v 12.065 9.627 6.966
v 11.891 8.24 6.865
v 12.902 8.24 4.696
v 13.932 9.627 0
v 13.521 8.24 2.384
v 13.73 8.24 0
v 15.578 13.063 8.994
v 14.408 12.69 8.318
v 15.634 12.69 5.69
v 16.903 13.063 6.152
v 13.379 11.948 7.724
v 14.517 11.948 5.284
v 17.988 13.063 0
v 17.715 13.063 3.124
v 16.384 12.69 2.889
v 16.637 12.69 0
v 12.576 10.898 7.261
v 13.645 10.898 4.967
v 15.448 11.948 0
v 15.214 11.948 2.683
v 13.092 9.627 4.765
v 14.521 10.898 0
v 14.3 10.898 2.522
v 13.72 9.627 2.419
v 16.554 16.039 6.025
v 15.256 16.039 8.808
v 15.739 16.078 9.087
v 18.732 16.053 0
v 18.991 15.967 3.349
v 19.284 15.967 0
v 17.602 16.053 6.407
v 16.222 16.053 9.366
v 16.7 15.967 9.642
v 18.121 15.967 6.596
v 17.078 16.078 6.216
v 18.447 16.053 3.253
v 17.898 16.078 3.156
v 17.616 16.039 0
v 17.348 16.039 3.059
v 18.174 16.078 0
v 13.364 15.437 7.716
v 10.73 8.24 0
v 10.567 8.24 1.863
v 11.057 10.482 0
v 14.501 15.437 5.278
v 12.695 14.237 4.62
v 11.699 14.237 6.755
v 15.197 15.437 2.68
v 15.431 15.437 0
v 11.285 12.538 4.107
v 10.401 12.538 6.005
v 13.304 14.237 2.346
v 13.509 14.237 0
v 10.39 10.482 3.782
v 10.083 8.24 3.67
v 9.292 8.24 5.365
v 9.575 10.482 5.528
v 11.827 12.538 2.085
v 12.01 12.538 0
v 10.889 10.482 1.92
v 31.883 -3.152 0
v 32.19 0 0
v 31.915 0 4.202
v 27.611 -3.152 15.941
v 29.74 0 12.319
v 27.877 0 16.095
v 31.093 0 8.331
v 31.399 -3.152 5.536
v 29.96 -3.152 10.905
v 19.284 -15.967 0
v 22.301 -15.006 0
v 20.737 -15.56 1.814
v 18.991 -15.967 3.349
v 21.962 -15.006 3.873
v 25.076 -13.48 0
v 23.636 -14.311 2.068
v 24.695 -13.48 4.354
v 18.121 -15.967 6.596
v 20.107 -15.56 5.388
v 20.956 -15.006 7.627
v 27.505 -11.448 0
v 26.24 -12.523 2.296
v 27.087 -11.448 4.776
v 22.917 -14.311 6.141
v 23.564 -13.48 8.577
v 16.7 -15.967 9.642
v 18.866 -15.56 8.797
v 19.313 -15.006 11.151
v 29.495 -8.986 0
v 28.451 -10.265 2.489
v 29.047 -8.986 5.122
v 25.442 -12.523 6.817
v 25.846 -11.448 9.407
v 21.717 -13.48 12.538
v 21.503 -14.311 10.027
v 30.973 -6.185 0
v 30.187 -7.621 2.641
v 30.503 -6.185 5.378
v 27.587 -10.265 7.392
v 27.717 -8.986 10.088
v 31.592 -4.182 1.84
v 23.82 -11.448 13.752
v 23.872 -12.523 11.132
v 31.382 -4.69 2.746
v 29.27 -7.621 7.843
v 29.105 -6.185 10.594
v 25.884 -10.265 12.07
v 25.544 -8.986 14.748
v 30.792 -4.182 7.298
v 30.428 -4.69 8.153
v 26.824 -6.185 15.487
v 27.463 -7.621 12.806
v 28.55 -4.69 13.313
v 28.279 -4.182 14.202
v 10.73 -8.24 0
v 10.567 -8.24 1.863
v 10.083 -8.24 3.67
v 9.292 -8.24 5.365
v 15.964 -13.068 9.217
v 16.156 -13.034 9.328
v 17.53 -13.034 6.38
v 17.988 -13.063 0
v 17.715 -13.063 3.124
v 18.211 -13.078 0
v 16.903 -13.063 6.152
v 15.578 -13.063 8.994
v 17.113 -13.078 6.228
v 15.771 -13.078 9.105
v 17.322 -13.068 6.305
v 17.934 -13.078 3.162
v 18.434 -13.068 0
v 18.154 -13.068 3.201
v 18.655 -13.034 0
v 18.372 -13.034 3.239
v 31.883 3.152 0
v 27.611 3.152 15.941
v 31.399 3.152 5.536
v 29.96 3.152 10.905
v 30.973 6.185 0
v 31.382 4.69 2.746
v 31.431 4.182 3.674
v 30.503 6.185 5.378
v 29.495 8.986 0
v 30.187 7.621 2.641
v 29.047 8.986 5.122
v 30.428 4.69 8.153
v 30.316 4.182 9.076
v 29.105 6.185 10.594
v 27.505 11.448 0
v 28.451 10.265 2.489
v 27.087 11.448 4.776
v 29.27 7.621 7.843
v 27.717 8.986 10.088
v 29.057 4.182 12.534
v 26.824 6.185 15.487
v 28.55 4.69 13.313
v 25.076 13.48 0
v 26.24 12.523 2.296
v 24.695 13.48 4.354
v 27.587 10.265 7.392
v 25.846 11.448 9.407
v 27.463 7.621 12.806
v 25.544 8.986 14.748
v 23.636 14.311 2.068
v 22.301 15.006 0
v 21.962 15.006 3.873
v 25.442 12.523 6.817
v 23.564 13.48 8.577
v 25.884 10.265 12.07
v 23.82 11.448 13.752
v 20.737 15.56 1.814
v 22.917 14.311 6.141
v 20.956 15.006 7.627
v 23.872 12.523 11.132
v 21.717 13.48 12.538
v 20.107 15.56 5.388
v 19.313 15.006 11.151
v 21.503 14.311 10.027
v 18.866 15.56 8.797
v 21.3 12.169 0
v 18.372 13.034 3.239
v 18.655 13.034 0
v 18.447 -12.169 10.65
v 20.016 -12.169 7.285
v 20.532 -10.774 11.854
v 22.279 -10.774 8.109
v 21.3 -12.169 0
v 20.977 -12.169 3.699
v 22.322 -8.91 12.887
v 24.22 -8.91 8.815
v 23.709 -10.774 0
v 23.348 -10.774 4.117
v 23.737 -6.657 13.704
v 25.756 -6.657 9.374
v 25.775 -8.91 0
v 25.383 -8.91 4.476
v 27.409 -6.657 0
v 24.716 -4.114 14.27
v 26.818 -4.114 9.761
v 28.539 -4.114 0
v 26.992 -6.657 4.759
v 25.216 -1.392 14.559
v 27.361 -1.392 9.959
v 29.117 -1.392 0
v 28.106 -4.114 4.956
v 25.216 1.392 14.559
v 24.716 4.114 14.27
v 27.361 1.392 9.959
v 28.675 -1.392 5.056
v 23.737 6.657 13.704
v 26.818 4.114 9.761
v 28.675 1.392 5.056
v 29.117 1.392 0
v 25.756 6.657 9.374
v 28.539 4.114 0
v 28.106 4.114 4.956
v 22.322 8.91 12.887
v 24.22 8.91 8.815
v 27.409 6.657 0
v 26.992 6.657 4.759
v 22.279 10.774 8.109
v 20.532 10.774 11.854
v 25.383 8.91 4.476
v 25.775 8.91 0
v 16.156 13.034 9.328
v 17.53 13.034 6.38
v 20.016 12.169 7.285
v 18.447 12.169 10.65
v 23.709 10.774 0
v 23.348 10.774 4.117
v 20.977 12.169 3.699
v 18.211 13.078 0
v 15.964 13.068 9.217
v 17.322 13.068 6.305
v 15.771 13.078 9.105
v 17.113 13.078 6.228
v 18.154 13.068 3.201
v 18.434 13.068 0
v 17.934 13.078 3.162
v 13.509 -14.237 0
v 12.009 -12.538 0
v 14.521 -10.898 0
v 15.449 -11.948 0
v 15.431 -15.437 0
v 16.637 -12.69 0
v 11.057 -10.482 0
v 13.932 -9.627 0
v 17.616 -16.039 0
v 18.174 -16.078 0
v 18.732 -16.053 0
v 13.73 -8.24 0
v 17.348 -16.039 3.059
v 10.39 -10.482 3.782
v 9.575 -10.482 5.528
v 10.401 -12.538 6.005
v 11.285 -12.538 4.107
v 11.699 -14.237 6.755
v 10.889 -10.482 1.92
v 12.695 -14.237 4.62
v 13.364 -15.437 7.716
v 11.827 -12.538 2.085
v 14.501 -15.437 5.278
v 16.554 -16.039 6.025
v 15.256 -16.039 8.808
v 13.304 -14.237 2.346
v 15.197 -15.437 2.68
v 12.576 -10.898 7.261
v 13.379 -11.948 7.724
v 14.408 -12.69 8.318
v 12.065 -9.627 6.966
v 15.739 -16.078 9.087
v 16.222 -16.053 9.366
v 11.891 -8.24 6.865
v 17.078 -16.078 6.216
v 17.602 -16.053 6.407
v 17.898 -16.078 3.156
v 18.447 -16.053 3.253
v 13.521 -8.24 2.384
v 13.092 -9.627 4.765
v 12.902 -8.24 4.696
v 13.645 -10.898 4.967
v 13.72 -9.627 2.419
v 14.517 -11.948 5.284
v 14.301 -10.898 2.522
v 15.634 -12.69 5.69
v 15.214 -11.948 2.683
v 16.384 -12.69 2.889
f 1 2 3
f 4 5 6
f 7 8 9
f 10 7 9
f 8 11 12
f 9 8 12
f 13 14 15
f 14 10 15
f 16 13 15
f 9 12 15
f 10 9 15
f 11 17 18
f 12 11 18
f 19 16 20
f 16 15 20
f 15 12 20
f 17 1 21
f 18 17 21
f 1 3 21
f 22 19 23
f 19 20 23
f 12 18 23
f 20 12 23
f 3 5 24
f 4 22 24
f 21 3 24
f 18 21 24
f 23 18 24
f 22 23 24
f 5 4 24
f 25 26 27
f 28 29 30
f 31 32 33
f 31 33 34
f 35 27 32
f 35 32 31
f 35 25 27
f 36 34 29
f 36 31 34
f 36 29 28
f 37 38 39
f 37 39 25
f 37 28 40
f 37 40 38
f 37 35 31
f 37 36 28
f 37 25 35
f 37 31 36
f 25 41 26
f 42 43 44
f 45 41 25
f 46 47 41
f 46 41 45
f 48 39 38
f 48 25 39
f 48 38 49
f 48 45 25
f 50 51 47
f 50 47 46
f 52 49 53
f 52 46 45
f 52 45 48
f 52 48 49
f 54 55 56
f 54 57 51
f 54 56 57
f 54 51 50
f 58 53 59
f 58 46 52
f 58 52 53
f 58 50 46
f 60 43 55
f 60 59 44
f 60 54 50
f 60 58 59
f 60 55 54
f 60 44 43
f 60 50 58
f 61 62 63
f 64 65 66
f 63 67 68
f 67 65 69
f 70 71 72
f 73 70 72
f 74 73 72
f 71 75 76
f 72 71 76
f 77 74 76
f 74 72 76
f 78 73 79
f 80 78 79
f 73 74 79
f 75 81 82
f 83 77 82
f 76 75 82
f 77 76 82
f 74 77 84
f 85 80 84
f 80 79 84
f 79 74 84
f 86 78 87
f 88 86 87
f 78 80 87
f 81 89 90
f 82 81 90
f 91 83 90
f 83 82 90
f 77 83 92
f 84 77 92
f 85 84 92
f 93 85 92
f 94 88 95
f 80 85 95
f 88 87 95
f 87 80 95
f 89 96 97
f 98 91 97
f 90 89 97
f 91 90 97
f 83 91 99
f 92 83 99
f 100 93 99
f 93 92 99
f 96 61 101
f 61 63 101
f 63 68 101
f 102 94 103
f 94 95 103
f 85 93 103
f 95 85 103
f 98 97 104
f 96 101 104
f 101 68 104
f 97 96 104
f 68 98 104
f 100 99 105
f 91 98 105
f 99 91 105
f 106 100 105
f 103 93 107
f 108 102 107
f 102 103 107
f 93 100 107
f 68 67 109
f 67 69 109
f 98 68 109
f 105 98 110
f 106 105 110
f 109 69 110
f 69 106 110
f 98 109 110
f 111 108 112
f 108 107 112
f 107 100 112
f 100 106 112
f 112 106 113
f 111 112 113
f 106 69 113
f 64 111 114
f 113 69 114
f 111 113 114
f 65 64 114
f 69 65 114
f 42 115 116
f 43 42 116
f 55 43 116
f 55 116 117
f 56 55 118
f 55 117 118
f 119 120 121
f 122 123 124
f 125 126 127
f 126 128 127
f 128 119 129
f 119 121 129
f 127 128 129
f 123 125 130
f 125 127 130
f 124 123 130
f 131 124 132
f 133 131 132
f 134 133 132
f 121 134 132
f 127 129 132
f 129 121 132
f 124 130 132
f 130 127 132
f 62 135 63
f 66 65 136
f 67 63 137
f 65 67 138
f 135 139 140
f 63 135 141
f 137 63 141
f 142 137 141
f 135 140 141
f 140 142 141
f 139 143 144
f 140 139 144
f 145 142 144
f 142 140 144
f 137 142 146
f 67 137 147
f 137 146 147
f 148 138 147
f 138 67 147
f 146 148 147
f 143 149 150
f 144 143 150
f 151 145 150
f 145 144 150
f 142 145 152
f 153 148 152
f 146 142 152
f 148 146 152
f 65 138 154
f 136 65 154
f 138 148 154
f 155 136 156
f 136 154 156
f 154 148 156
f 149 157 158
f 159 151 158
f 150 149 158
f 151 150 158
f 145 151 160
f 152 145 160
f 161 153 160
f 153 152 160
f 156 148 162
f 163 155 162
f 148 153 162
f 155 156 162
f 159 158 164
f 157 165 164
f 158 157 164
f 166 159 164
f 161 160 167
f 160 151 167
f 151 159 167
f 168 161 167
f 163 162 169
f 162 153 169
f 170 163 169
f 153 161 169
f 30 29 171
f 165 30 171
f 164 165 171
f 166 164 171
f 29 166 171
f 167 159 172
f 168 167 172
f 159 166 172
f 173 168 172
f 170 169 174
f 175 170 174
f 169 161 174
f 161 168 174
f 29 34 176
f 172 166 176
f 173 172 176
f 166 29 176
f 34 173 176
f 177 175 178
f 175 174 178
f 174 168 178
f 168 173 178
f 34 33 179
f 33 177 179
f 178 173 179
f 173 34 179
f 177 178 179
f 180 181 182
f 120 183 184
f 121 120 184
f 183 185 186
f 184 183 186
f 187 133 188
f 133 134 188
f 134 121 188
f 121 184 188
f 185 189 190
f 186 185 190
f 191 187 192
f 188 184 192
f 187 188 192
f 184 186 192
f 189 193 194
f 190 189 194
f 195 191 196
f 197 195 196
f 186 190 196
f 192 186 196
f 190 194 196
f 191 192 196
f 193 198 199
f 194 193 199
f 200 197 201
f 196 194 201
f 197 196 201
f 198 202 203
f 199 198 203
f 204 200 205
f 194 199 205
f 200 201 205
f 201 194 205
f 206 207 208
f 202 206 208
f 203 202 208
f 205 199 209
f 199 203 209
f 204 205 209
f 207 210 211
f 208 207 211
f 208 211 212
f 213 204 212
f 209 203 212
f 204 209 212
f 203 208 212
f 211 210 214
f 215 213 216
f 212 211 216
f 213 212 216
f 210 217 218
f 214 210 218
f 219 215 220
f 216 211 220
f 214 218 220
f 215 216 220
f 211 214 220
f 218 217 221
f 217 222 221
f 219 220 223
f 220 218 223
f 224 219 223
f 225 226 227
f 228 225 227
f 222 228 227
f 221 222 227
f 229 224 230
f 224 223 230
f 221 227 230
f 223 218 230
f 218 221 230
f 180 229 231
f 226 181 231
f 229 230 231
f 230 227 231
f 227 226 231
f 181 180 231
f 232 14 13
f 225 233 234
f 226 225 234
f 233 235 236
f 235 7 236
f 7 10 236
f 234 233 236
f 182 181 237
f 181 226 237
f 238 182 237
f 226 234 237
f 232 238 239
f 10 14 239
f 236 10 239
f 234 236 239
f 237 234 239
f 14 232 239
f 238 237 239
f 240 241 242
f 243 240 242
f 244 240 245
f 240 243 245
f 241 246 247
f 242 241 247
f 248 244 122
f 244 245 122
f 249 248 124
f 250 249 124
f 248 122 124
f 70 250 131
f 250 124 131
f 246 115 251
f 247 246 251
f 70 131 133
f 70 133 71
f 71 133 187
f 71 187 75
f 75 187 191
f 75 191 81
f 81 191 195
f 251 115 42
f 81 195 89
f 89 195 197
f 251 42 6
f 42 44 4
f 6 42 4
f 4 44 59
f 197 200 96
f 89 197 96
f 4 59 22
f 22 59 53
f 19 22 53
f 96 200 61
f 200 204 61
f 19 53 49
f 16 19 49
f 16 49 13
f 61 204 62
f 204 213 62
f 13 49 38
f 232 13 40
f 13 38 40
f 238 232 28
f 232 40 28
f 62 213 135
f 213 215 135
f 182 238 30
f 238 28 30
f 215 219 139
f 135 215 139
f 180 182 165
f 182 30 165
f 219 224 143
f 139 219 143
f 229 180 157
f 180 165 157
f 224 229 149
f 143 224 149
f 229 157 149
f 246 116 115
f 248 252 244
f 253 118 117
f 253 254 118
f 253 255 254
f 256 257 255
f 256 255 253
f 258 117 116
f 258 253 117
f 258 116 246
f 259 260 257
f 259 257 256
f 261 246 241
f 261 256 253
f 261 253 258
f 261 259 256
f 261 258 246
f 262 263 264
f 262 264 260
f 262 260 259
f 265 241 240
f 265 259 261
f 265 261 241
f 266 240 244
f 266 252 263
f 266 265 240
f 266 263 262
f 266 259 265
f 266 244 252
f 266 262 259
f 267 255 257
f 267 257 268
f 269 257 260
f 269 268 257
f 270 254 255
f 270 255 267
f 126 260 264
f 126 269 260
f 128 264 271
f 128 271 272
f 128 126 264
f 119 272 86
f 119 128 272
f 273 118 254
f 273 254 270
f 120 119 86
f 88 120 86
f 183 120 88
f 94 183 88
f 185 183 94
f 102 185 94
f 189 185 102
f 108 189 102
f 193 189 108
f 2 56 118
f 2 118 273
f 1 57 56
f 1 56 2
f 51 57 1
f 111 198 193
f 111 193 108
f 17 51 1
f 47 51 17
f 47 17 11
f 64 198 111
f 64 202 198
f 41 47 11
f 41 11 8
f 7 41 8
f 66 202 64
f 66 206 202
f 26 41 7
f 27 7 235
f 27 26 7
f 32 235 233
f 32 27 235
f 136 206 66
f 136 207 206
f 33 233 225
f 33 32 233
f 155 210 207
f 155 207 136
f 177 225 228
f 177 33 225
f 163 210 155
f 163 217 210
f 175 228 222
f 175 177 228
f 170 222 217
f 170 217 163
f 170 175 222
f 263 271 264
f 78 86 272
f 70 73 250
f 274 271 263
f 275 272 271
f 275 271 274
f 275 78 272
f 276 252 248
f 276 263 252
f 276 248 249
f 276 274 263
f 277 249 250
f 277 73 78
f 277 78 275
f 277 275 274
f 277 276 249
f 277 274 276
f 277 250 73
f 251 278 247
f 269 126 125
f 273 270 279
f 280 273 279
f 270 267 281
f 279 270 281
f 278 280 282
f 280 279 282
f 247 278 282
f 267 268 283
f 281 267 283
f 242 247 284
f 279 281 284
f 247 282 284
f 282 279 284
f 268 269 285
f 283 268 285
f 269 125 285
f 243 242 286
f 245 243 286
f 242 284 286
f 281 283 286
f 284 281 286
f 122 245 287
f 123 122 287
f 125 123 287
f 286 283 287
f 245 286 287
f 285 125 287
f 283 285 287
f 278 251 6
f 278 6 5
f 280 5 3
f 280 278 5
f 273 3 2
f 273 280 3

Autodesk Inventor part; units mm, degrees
ref_plane "Work Plane1" through (-7, 0, -29.5697) normal (1, 0, 0) x (0, 0, -1)
ref_plane "YZ Plane" through (0, 0, 0) normal (1, 0, 0) x (0, 1, 0)
ref_plane "XZ Plane" through (0, 0, 0) normal (0, 1, 0) x (-1, 0, 0)
sketch "Sketch1" plane through (0, 0, 0) normal (0, 0, 1) x (1, 0, 0)
  line L0 (0, 0) -> (0, 16.1) construction
  line L1 (10.73, 8.24) -> (10.73, -8.24)
  line L2 (18.59, 16.1) -> (18.59, -16.1) construction
  arc A0 (17.6161, 16.0394) -> (10.73, 8.24) centre (18.59, 8.24) ccw
  arc A1 (10.73, -8.24) -> (17.6161, -16.0394) centre (18.59, -8.24) ccw
  arc A2 (19.284, -15.9668) -> (19.284, 15.9668) centre (15.8602, 0) ccw
  line L3 (0, 0) -> (51.4073, 0)
  arc A3 (19.284, 15.9668) -> (17.6161, 16.0394) centre (18.2356, 11.078) ccw
  arc A4 (17.6161, -16.0394) -> (19.284, -15.9668) centre (18.2356, -11.078) ccw
  arc A5 (18.655, 13.0335) -> (17.9878, 13.0626) centre (18.2356, 11.078) ccw
  arc A6 (17.9878, 13.0626) -> (13.73, 8.24) centre (18.59, 8.24) ccw
  line L4 (13.73, 8.24) -> (13.73, -8.24)
  arc A7 (13.73, -8.24) -> (17.9878, -13.0626) centre (18.59, -8.24) ccw
  arc A8 (17.9878, -13.0626) -> (18.655, -13.0335) centre (18.2356, -11.078) ccw
  arc A9 (18.655, -13.0335) -> (18.655, 13.0335) centre (15.8602, 0) ccw
  point P0 (10.73, 0)
  point P1 (32.19, 0)
  point P2 (18.59, 0)
  dimension "MaxHeight" = 16.1
  dimension "FlatHeightx2" = 16.48
  dimension "ID" = 21.46
  dimension "OD" = 64.38
  dimension "d5" = 32.2
  dimension "RadAtPeak" = 18.59
  dimension "d90" = 5
  dimension "d97" = 3
revolve "Revolution1" add sketch "Sketch1" angle 30 about axis through (0, 0, 0) along (0, -1, 0) contours A0 A3 A2 L3 A9 A5 A6 L4 L1 | L3 L4 A7 A8 A9 A2 A4 A1 L1
sketch "Sketch13" plane through (10.73, -8.24, 0) normal (0, 0, -1) x (-1, 0, 0)
  arc A0 (0, 16.48) -> (-6.8861, 24.2794) centre (-7.86, 16.48) ccw projected
  arc A1 (-6.8861, 24.2794) -> (-8.554, 24.2068) centre (-7.5056, 19.318) ccw projected
  arc A2 (-8.554, 24.2068) -> (-8.6304, 24.1903) centre (-5.1302, 8.24) ccw projected
  arc A3 (-8.554, -7.7268) -> (-6.8861, -7.7994) centre (-7.5056, -2.838) ccw projected
  arc A4 (-6.8861, -7.7994) -> (0, 0) centre (-7.86, 0) ccw projected
  line L0 (0, 16.48) -> (0, 0) projected
  line L1 (-7.86, 0) -> (3, 0)
  line L2 (3, 0) -> (3, 16.48)
  line L3 (3, 16.48) -> (-7.86, 16.48)
  line L4 (-7.86, 16.48) -> (-7.86, 0)
  arc A5 (-8.6304, 24.1903) -> (-8.6304, -7.7103) centre (-5.1302, 8.24) ccw projected
  point P0 (10.73, 8.24)
  point P1 (-4.6967, 8.3392)
  dimension "d93" = 3
sketch "Sketch7" plane through (0, 0, 0) normal (0, 1, 0) x (-1, 0, 0)
  circle A0 centre (0, 0) radius 198.9616
sketch "Sketch8" plane through (0, 0, 0) normal (1, 0, 0) x (0, 1, 0)
  circle A0 centre (0, 0) radius 159.0195
sketch "Sketch9" plane through (0, 0, 0) normal (1, 0, 0) x (0, 0, -1)
  line L0 (74, 0) -> (35, 0) projected
  point P0 (0, 0)
  point P1 (-52.5, 0)
  point P2 (0, 0)
  point P3 (52.5, 0)
  dimension "d88" = 105
  dimension "d89" = 52.5
sketch "Sketch11" plane through (0, 0, 0) normal (1, 0, 0) x (0, 0, -1)
  arc A0 (-35, 25.9107) -> (-42.6927, 34.8921) centre (-44.0893, 25.9107) ccw projected
  line L0 (-35, 25.9107) -> (-35, 0) projected
  line L1 (-35, 0) -> (35, 0) projected
  arc A1 (-50.0415, 0) -> (-54.9585, 0) centre (-52.5, 0) ccw projected
  arc A2 (-50.0415, 0) -> (-54.9585, 0) centre (-37.5, 0) ccw projected
  arc A3 (-39.8678, 39.0634) -> (-73, 0) centre (-33.4058, 0) ccw
  arc A4 (-29.5697, 27.789) -> (-36.4391, 38.3935) centre (-44.0893, 25.9107) ccw
  line L2 (-29.5697, 27.789) -> (-29.5697, 0)
  line L3 (-35, 0) -> (35, 0) projected
  line L4 (-73, 0) -> (-29.5697, 0)
  arc A5 (-36.4391, 38.3935) -> (-39.8678, 39.0634) centre (-39.0518, 34.1304) ccw
  point P0 (0, 0)
  point P1 (-35, 0)
  point P2 (-29.5697, 0)
  point P3 (-54.9585, 0)
  point P4 (-50.0415, 0)
  dimension "d91" = 5
sketch "Sketch6" plane through (0.6222, 0, 0.3592) normal (-0.5, 0, 0.866) x (0, 1, 0)
  line L0 (-8.24, -10.0116) -> (8.24, -10.0116) projected
  arc A0 (-15.9668, -18.5655) -> (15.9668, -18.5655) centre (0, -15.1418) ccw projected
  arc A1 (-17.2892, -21.2298) -> (17.2892, -21.2298) centre (0, -15.1418) ccw
  line L1 (15.9668, -18.5655) -> (15.4028, -18.5655)
  arc A2 (17.2892, -21.2298) -> (15.4028, -18.5655) centre (15.4028, -20.5655) ccw
  line L2 (-15.4028, -18.5655) -> (-15.9668, -18.5655)
  arc A3 (-15.4028, -18.5655) -> (-17.2892, -21.2298) centre (-15.4028, -20.5655) ccw
  line L3 (-25.2101, 0.7184) -> (25.2101, 0.7184) projected
  point P0 (0, 0.7184)
  point P1 (-18.0072, -18.5655)
  point P2 (18.0072, -18.5655)
  point P3 (15.9503, -18.6419)
  point P4 (-15.9503, -18.6419)
  dimension "d47" = 2
  dimension "d48" = 2
  dimension "d49" = 2
equation "\"d5\" = 2 * MaxHeight"
equation "\"d63_Copy\" = 35"
properties part number "L_Notch1-Wedge" material "UHMW, White"
